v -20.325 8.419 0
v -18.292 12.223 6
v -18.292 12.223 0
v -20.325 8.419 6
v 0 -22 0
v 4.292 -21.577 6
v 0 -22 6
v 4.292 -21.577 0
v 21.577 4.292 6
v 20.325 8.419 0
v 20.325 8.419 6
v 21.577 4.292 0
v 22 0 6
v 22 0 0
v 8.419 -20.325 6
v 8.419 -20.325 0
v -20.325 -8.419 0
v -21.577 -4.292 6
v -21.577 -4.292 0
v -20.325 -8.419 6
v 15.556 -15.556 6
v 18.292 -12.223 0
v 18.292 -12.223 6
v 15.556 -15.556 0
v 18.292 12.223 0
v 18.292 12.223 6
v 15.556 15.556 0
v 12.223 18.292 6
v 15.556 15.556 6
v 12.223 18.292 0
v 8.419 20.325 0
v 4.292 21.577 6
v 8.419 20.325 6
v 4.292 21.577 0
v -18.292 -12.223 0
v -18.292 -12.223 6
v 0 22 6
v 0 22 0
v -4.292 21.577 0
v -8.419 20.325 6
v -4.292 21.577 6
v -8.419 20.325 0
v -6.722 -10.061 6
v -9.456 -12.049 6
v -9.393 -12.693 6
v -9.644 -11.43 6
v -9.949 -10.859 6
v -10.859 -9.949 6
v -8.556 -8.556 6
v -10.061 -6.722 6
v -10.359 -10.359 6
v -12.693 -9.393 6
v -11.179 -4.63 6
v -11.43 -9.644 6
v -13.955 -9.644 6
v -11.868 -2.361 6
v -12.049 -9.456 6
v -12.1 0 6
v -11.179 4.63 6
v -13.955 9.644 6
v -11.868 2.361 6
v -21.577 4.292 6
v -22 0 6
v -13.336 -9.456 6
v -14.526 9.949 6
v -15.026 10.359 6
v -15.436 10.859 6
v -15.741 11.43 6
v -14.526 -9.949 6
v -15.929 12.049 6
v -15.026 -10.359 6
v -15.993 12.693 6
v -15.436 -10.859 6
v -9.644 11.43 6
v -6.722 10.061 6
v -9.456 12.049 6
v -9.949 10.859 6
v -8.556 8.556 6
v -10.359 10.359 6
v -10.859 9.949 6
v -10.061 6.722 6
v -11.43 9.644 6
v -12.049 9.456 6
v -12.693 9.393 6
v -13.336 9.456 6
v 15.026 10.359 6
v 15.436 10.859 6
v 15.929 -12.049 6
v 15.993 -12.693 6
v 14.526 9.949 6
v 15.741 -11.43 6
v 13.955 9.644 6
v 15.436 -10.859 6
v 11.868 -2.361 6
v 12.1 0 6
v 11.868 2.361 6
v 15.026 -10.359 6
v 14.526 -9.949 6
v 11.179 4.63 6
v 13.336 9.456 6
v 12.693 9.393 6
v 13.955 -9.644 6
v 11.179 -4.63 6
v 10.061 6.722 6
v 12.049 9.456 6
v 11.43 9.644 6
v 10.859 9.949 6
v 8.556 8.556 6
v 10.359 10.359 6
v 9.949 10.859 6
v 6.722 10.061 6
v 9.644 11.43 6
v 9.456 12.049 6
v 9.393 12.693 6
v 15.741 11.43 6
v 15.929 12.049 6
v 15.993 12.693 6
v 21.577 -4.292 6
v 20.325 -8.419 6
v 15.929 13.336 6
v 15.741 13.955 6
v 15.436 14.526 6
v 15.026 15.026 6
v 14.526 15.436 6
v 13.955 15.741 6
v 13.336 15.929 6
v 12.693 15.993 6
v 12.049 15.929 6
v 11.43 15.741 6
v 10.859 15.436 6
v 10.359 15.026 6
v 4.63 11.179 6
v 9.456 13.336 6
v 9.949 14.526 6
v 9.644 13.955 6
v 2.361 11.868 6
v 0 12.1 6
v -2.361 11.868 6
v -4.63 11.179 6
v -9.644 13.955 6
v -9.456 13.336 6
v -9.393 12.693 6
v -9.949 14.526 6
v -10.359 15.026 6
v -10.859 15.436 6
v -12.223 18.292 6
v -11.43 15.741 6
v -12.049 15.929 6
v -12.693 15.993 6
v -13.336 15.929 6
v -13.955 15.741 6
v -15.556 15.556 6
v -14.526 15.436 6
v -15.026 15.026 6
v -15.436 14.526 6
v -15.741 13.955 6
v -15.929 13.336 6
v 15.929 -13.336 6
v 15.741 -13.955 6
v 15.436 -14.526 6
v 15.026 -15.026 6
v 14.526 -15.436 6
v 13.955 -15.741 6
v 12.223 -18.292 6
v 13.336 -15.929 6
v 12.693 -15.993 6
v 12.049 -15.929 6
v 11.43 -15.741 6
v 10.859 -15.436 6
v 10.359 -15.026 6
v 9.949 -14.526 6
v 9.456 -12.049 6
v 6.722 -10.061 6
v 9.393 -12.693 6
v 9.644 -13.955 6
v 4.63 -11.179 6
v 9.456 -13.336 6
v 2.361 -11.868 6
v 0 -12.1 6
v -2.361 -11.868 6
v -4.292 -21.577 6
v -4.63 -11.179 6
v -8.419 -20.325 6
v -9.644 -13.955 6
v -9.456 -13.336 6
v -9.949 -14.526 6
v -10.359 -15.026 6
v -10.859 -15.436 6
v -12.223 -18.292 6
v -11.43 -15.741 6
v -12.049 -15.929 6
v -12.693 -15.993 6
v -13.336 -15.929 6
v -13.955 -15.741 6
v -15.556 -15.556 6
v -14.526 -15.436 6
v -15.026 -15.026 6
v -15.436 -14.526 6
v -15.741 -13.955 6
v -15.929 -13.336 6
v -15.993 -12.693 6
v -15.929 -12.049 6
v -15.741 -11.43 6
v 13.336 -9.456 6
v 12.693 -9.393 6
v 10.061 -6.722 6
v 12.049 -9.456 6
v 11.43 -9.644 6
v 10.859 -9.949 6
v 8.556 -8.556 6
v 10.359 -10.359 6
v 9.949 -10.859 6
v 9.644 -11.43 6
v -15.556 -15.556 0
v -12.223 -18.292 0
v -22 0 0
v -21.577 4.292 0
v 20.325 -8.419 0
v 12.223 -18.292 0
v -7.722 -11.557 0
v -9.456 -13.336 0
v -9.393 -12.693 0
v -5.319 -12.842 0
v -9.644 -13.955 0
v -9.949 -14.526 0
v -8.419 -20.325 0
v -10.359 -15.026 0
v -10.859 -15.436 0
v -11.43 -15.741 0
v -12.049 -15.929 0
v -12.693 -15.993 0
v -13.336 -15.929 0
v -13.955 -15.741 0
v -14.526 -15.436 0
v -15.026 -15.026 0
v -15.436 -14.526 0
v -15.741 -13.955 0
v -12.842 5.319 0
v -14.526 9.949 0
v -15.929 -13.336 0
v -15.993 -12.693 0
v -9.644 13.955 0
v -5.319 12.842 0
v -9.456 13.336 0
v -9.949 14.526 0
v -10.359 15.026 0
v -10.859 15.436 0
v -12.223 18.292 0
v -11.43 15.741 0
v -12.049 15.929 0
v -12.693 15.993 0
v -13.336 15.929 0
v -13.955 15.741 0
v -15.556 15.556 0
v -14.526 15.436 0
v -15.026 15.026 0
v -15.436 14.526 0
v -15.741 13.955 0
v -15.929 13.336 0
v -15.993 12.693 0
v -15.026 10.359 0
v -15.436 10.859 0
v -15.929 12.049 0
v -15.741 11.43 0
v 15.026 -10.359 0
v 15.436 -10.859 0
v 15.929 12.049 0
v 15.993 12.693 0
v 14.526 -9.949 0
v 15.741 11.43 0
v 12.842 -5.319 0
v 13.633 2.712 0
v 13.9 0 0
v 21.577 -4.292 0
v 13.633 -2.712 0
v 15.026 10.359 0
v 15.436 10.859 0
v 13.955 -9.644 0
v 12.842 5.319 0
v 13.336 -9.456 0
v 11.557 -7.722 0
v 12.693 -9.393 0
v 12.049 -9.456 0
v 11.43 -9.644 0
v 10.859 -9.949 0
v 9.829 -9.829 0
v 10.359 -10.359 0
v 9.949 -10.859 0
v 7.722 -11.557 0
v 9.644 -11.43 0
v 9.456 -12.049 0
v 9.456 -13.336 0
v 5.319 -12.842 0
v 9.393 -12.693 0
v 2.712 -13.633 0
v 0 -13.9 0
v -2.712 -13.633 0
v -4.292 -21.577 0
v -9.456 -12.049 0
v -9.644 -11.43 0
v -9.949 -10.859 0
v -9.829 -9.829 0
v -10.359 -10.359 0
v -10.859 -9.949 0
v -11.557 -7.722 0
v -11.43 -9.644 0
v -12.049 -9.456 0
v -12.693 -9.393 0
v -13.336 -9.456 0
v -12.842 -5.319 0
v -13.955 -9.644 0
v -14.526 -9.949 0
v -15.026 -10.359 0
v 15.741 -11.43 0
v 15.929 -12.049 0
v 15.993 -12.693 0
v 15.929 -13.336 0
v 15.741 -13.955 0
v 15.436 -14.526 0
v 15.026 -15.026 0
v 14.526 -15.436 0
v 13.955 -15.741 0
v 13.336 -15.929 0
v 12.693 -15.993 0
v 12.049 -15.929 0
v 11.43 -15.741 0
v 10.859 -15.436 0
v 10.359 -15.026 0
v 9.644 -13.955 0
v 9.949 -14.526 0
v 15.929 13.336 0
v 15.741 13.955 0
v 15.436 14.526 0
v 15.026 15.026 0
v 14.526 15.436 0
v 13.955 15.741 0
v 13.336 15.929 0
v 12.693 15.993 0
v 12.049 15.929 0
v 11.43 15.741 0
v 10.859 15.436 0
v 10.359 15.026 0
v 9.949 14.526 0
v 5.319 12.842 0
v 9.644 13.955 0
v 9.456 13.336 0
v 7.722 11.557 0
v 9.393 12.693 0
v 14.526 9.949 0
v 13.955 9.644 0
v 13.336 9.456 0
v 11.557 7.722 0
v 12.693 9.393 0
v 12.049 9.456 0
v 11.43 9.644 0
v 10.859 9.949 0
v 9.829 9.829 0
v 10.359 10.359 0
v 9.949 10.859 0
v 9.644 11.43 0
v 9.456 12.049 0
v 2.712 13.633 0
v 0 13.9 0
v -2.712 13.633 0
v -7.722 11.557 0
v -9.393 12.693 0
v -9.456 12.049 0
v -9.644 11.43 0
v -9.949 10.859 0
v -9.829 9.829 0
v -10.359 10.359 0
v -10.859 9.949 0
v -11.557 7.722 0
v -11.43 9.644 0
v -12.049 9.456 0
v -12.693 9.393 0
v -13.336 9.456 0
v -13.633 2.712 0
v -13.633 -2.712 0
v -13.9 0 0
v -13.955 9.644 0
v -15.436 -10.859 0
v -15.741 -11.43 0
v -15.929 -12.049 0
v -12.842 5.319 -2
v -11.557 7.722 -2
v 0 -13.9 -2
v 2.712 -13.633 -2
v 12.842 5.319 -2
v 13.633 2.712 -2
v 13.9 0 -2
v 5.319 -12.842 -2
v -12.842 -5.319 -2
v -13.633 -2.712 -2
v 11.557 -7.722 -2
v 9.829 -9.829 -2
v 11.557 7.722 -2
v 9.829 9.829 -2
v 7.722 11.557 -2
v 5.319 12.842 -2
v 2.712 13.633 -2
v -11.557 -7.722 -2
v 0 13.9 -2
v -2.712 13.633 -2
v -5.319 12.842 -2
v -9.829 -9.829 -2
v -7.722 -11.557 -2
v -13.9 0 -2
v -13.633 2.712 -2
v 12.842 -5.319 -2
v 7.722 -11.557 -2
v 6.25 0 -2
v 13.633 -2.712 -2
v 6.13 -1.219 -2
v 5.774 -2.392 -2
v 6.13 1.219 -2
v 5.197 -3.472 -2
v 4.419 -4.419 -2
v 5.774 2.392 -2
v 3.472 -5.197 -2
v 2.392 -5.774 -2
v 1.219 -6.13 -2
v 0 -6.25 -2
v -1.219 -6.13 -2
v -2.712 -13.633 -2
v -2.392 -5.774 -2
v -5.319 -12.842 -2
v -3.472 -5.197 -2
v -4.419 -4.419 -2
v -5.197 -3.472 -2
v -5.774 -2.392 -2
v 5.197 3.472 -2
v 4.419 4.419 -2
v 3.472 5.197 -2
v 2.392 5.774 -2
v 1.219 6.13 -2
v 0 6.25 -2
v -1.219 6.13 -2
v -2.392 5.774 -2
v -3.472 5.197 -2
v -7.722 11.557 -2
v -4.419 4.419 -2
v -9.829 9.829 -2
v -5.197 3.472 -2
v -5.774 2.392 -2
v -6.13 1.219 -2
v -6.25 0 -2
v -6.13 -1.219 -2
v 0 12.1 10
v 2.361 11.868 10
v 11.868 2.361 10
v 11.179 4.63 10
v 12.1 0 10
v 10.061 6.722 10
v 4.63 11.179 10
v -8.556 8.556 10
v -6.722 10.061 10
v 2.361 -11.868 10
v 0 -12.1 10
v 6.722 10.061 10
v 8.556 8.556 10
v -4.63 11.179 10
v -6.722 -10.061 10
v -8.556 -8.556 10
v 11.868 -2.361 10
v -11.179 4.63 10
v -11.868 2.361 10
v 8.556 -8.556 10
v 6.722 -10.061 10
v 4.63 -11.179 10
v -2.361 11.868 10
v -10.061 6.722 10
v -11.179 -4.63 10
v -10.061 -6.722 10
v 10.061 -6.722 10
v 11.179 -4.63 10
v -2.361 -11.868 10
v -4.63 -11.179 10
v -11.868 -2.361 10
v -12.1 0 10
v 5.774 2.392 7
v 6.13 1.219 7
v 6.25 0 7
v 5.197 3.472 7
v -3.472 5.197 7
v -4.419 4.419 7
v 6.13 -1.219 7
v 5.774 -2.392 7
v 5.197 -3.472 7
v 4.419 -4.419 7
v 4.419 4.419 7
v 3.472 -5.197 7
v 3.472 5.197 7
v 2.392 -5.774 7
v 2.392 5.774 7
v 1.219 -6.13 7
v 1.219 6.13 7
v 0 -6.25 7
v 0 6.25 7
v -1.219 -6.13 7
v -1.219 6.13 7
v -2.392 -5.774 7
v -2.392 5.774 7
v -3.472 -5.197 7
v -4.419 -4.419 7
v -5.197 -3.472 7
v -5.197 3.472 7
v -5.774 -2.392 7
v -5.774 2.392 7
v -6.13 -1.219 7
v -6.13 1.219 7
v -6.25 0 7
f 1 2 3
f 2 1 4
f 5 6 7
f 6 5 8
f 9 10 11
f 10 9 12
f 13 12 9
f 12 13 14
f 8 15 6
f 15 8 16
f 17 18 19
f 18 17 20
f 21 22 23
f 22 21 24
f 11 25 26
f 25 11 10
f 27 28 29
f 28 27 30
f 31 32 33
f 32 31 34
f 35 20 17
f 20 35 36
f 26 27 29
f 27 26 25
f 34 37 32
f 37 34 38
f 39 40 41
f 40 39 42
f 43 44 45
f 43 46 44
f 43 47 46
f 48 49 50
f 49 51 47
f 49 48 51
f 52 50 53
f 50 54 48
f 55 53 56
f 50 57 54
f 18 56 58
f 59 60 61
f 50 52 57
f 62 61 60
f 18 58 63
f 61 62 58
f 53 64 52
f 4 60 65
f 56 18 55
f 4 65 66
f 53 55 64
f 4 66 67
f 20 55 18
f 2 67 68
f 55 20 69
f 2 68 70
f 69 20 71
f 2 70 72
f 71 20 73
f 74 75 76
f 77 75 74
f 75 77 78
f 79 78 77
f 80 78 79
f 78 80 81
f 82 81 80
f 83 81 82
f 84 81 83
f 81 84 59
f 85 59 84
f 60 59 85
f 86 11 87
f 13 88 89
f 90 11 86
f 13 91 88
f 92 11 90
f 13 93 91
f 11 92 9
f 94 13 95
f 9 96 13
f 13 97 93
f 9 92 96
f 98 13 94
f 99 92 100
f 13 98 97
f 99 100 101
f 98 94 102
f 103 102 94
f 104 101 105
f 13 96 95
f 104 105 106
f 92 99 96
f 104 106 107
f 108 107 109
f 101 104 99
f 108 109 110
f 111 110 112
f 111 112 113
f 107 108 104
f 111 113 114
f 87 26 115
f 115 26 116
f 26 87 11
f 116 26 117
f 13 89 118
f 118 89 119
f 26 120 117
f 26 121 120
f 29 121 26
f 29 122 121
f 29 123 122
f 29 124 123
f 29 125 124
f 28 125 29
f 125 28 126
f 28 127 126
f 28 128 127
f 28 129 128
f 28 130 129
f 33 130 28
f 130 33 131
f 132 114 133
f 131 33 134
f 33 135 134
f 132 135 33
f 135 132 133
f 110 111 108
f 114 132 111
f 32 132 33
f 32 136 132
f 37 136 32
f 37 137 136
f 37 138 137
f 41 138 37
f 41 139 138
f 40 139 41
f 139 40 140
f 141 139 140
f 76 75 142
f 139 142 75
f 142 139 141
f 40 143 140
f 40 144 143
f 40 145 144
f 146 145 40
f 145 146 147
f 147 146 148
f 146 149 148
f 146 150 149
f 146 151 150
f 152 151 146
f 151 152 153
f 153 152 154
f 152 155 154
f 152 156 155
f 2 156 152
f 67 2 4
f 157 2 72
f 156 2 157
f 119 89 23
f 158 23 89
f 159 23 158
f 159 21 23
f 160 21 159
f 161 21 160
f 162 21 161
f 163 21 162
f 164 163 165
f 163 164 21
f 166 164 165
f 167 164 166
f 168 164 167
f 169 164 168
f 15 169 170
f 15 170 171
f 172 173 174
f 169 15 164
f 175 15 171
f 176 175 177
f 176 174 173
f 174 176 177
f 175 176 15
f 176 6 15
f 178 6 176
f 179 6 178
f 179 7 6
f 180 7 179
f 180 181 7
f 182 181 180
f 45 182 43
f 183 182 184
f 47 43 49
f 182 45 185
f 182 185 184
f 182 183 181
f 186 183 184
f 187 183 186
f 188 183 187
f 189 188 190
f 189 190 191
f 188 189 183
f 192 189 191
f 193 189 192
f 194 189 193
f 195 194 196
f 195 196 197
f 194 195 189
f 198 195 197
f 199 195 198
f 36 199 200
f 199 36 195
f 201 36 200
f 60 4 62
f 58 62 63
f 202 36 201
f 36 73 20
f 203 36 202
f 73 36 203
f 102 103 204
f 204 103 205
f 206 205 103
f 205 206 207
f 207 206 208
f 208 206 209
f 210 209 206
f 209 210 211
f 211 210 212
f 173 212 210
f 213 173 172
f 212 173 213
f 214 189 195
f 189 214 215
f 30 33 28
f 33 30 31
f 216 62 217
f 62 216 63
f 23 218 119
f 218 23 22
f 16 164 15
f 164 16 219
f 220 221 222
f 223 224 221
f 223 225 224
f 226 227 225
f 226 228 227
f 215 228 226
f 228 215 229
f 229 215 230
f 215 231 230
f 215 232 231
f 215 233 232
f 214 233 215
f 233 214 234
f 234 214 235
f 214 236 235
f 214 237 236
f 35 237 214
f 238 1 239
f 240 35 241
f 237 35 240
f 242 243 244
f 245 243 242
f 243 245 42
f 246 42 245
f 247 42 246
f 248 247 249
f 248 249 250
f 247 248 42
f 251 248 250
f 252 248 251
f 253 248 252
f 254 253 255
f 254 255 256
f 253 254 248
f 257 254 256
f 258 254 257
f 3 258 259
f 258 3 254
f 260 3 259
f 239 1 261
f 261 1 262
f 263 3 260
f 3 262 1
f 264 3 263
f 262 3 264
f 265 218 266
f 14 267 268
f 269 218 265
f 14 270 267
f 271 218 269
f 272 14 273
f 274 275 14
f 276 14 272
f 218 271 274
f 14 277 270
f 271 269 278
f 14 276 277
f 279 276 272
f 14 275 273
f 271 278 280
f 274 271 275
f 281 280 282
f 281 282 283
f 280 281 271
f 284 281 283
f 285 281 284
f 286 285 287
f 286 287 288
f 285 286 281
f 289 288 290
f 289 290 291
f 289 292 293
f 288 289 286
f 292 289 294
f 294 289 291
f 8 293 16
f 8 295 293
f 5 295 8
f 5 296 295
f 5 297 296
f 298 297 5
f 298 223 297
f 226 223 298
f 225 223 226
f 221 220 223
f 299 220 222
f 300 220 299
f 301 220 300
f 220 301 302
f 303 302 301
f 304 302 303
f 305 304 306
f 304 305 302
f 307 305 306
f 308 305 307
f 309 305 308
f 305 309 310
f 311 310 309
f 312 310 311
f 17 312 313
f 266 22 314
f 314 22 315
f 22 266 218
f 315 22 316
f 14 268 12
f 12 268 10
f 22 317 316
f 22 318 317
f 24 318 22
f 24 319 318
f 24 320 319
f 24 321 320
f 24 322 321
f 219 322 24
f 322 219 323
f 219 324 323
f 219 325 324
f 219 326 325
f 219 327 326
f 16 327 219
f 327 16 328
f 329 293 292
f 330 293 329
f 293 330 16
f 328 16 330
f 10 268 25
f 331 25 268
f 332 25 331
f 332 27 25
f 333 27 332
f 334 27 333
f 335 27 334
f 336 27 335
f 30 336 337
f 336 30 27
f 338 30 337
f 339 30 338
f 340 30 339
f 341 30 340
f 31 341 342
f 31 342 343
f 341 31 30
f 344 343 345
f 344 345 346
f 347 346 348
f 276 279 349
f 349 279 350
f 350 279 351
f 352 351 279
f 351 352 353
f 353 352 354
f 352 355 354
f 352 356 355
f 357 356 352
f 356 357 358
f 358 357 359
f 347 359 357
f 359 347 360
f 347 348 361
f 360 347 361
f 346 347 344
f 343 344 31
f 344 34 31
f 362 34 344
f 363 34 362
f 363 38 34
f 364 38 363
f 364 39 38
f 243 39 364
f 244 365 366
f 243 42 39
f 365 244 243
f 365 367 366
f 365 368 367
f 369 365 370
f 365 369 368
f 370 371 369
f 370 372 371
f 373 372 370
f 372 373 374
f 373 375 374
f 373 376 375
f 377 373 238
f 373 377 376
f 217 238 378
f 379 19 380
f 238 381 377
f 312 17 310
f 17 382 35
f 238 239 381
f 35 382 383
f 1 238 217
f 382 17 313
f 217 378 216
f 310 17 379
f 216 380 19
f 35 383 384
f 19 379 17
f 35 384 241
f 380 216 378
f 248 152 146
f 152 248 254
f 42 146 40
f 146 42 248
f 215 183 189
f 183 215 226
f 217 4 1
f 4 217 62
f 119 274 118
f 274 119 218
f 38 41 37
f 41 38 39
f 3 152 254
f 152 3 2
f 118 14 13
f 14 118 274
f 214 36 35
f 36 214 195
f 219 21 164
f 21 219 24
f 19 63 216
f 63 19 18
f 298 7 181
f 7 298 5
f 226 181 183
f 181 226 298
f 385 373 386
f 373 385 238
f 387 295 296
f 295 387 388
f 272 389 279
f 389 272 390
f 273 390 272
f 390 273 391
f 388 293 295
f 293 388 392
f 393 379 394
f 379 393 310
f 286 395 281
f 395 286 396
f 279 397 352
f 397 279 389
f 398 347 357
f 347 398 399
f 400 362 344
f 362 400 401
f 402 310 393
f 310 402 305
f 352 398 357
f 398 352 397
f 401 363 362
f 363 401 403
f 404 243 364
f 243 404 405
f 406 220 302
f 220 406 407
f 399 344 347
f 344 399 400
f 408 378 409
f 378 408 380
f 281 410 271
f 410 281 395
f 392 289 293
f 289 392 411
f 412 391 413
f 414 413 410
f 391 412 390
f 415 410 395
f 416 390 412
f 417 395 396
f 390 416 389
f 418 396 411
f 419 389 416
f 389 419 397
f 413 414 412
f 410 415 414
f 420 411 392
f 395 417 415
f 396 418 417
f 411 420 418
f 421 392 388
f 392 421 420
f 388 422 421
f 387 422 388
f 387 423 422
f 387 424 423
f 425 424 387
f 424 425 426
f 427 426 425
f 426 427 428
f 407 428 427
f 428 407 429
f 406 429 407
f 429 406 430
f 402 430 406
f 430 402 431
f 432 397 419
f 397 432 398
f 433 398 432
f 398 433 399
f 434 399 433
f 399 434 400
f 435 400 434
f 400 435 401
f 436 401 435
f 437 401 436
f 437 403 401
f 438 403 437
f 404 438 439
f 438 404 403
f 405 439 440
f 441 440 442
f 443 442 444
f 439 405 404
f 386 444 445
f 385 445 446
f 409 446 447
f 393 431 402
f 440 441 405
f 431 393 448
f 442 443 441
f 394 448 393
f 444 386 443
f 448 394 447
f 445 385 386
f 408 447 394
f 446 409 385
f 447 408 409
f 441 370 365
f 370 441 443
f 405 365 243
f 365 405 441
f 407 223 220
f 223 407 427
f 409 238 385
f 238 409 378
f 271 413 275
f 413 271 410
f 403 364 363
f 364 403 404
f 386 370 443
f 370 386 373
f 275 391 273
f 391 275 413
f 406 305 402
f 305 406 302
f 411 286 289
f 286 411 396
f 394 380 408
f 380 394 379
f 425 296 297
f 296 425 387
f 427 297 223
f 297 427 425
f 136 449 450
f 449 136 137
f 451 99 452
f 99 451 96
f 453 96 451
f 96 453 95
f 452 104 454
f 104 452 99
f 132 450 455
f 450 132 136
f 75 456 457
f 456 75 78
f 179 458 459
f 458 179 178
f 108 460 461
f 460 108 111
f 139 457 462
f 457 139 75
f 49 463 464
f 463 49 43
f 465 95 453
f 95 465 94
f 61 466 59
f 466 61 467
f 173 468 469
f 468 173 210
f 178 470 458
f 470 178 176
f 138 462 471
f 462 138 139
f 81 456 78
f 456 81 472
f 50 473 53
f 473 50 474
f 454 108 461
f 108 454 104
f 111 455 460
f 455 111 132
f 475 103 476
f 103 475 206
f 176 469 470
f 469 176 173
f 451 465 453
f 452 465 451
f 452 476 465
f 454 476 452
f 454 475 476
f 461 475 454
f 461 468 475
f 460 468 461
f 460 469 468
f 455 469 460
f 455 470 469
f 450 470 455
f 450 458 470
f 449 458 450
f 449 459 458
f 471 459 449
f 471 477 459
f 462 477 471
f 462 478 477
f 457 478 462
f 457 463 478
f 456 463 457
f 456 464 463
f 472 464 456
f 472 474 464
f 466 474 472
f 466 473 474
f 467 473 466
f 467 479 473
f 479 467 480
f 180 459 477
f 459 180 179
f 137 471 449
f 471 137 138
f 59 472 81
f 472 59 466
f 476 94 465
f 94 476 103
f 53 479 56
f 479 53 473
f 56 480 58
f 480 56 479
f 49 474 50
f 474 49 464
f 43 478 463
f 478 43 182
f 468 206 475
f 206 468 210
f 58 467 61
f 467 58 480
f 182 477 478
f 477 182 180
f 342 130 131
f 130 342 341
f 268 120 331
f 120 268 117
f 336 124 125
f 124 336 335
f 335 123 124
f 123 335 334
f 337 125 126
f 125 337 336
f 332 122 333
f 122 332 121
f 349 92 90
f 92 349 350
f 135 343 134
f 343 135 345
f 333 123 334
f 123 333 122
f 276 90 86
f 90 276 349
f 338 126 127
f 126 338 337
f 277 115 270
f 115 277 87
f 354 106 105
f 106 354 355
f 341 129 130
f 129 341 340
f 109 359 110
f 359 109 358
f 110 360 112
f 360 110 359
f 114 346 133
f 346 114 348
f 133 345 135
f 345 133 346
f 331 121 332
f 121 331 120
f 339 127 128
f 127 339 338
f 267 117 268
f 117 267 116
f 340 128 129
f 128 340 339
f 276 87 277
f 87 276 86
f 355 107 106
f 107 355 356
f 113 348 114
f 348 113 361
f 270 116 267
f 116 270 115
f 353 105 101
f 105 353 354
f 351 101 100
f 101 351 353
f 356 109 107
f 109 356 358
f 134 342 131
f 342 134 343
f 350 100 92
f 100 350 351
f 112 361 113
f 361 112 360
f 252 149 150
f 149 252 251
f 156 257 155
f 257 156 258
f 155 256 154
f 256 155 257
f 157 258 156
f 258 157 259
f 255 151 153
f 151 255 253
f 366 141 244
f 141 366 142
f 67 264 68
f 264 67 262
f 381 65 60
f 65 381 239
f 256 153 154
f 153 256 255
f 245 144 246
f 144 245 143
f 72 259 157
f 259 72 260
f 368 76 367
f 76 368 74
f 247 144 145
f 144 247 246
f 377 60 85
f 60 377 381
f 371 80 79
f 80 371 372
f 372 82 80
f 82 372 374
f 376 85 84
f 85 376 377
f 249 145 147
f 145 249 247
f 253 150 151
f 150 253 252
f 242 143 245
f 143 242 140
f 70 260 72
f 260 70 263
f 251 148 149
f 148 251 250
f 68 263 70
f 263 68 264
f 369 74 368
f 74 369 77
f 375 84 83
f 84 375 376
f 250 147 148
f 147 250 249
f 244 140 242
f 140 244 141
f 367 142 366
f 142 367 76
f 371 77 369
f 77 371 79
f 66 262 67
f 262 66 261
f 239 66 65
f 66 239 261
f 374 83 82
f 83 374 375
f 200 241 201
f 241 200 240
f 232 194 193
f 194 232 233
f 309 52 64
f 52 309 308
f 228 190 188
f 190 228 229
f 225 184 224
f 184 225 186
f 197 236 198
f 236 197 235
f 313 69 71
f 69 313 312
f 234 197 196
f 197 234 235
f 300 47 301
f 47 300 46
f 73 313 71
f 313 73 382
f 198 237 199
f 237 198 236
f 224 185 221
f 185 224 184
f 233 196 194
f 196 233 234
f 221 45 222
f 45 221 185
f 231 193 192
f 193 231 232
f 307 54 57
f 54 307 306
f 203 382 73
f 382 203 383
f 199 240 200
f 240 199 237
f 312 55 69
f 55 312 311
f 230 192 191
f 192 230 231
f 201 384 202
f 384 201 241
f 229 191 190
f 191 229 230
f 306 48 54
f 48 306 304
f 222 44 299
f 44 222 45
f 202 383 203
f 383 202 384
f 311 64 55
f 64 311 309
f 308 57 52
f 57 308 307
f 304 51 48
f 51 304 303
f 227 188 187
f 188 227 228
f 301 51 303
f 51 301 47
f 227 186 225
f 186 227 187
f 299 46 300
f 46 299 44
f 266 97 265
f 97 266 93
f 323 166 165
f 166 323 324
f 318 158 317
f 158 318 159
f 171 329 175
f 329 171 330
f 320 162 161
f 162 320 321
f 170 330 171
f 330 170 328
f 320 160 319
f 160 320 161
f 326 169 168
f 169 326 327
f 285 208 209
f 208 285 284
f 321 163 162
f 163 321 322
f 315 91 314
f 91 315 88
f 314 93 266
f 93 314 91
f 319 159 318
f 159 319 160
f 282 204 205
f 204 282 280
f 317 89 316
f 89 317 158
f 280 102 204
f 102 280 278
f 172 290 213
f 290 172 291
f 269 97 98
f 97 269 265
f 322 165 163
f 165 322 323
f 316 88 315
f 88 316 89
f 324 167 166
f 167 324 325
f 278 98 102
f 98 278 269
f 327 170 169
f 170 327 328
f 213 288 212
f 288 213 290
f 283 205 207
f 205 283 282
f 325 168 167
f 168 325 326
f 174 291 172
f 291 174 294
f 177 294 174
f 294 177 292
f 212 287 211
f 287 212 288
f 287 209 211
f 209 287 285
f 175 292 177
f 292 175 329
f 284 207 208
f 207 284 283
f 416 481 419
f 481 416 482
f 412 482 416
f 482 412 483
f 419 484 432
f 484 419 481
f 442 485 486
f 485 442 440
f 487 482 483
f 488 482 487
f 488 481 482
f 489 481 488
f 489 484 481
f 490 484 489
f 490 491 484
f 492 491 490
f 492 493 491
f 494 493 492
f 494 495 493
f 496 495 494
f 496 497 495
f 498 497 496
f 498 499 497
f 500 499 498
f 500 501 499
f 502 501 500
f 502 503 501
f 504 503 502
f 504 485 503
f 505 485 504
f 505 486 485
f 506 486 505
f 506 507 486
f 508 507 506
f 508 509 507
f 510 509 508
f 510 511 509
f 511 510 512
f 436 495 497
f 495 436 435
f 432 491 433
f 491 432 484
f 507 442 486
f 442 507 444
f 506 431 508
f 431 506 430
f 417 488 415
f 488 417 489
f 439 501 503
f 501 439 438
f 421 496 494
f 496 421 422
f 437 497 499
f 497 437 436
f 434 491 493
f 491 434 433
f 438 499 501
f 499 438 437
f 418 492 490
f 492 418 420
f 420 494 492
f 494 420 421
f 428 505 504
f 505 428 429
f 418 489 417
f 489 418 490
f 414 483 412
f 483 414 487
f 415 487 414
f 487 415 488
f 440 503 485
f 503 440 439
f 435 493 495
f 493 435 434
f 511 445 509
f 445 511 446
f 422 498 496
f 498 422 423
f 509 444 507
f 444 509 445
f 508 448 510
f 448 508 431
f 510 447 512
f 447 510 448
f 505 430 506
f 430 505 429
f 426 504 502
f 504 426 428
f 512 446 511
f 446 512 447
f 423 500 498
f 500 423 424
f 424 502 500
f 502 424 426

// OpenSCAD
$fn = 32;

// ----------------------------------------------------------------------
// Retaining cap: 6001 cover, 44 mm, spigot 27.8 mm
// ----------------------------------------------------------------------

// --- parameters (mm) ---
cover_d = 44;             // cover diameter
cover_t = 6;              // cover thickness
spigot_d = 27.8;          // spigot that enters the housing
spigot_h = 2;             // spigot height
shaft_d = 12.5;           // shaft opening
bolt_d = 6.6;             // bolt clearance
bolt_r = 17.95;           // bolt circle radius
dome_h = 4;               // raised centre

module cover() {
  cylinder(h = cover_t, d = cover_d);
}

module spigot() {
  /* sunk 1 mm into the cover; the spigot sets the overall height */
  translate([0, 0, -spigot_h]) cylinder(h = spigot_h + 1, d = spigot_d);
}

module dome() {
  translate([0, 0, cover_t - 1]) cylinder(h = dome_h + 1, d = cover_d * 0.55);
}

difference() {
  union() {
    cover();
    spigot();
    dome();
  }
  for (i = [0 : 3]) rotate([0, 0, 45 + i * 90]) translate([bolt_r, 0, -spigot_h - 1])
    cylinder(h = spigot_h + cover_t + 2, d = bolt_d);
  translate([0, 0, -spigot_h - 1]) cylinder(h = spigot_h + cover_t + 2, d = shaft_d);
}
